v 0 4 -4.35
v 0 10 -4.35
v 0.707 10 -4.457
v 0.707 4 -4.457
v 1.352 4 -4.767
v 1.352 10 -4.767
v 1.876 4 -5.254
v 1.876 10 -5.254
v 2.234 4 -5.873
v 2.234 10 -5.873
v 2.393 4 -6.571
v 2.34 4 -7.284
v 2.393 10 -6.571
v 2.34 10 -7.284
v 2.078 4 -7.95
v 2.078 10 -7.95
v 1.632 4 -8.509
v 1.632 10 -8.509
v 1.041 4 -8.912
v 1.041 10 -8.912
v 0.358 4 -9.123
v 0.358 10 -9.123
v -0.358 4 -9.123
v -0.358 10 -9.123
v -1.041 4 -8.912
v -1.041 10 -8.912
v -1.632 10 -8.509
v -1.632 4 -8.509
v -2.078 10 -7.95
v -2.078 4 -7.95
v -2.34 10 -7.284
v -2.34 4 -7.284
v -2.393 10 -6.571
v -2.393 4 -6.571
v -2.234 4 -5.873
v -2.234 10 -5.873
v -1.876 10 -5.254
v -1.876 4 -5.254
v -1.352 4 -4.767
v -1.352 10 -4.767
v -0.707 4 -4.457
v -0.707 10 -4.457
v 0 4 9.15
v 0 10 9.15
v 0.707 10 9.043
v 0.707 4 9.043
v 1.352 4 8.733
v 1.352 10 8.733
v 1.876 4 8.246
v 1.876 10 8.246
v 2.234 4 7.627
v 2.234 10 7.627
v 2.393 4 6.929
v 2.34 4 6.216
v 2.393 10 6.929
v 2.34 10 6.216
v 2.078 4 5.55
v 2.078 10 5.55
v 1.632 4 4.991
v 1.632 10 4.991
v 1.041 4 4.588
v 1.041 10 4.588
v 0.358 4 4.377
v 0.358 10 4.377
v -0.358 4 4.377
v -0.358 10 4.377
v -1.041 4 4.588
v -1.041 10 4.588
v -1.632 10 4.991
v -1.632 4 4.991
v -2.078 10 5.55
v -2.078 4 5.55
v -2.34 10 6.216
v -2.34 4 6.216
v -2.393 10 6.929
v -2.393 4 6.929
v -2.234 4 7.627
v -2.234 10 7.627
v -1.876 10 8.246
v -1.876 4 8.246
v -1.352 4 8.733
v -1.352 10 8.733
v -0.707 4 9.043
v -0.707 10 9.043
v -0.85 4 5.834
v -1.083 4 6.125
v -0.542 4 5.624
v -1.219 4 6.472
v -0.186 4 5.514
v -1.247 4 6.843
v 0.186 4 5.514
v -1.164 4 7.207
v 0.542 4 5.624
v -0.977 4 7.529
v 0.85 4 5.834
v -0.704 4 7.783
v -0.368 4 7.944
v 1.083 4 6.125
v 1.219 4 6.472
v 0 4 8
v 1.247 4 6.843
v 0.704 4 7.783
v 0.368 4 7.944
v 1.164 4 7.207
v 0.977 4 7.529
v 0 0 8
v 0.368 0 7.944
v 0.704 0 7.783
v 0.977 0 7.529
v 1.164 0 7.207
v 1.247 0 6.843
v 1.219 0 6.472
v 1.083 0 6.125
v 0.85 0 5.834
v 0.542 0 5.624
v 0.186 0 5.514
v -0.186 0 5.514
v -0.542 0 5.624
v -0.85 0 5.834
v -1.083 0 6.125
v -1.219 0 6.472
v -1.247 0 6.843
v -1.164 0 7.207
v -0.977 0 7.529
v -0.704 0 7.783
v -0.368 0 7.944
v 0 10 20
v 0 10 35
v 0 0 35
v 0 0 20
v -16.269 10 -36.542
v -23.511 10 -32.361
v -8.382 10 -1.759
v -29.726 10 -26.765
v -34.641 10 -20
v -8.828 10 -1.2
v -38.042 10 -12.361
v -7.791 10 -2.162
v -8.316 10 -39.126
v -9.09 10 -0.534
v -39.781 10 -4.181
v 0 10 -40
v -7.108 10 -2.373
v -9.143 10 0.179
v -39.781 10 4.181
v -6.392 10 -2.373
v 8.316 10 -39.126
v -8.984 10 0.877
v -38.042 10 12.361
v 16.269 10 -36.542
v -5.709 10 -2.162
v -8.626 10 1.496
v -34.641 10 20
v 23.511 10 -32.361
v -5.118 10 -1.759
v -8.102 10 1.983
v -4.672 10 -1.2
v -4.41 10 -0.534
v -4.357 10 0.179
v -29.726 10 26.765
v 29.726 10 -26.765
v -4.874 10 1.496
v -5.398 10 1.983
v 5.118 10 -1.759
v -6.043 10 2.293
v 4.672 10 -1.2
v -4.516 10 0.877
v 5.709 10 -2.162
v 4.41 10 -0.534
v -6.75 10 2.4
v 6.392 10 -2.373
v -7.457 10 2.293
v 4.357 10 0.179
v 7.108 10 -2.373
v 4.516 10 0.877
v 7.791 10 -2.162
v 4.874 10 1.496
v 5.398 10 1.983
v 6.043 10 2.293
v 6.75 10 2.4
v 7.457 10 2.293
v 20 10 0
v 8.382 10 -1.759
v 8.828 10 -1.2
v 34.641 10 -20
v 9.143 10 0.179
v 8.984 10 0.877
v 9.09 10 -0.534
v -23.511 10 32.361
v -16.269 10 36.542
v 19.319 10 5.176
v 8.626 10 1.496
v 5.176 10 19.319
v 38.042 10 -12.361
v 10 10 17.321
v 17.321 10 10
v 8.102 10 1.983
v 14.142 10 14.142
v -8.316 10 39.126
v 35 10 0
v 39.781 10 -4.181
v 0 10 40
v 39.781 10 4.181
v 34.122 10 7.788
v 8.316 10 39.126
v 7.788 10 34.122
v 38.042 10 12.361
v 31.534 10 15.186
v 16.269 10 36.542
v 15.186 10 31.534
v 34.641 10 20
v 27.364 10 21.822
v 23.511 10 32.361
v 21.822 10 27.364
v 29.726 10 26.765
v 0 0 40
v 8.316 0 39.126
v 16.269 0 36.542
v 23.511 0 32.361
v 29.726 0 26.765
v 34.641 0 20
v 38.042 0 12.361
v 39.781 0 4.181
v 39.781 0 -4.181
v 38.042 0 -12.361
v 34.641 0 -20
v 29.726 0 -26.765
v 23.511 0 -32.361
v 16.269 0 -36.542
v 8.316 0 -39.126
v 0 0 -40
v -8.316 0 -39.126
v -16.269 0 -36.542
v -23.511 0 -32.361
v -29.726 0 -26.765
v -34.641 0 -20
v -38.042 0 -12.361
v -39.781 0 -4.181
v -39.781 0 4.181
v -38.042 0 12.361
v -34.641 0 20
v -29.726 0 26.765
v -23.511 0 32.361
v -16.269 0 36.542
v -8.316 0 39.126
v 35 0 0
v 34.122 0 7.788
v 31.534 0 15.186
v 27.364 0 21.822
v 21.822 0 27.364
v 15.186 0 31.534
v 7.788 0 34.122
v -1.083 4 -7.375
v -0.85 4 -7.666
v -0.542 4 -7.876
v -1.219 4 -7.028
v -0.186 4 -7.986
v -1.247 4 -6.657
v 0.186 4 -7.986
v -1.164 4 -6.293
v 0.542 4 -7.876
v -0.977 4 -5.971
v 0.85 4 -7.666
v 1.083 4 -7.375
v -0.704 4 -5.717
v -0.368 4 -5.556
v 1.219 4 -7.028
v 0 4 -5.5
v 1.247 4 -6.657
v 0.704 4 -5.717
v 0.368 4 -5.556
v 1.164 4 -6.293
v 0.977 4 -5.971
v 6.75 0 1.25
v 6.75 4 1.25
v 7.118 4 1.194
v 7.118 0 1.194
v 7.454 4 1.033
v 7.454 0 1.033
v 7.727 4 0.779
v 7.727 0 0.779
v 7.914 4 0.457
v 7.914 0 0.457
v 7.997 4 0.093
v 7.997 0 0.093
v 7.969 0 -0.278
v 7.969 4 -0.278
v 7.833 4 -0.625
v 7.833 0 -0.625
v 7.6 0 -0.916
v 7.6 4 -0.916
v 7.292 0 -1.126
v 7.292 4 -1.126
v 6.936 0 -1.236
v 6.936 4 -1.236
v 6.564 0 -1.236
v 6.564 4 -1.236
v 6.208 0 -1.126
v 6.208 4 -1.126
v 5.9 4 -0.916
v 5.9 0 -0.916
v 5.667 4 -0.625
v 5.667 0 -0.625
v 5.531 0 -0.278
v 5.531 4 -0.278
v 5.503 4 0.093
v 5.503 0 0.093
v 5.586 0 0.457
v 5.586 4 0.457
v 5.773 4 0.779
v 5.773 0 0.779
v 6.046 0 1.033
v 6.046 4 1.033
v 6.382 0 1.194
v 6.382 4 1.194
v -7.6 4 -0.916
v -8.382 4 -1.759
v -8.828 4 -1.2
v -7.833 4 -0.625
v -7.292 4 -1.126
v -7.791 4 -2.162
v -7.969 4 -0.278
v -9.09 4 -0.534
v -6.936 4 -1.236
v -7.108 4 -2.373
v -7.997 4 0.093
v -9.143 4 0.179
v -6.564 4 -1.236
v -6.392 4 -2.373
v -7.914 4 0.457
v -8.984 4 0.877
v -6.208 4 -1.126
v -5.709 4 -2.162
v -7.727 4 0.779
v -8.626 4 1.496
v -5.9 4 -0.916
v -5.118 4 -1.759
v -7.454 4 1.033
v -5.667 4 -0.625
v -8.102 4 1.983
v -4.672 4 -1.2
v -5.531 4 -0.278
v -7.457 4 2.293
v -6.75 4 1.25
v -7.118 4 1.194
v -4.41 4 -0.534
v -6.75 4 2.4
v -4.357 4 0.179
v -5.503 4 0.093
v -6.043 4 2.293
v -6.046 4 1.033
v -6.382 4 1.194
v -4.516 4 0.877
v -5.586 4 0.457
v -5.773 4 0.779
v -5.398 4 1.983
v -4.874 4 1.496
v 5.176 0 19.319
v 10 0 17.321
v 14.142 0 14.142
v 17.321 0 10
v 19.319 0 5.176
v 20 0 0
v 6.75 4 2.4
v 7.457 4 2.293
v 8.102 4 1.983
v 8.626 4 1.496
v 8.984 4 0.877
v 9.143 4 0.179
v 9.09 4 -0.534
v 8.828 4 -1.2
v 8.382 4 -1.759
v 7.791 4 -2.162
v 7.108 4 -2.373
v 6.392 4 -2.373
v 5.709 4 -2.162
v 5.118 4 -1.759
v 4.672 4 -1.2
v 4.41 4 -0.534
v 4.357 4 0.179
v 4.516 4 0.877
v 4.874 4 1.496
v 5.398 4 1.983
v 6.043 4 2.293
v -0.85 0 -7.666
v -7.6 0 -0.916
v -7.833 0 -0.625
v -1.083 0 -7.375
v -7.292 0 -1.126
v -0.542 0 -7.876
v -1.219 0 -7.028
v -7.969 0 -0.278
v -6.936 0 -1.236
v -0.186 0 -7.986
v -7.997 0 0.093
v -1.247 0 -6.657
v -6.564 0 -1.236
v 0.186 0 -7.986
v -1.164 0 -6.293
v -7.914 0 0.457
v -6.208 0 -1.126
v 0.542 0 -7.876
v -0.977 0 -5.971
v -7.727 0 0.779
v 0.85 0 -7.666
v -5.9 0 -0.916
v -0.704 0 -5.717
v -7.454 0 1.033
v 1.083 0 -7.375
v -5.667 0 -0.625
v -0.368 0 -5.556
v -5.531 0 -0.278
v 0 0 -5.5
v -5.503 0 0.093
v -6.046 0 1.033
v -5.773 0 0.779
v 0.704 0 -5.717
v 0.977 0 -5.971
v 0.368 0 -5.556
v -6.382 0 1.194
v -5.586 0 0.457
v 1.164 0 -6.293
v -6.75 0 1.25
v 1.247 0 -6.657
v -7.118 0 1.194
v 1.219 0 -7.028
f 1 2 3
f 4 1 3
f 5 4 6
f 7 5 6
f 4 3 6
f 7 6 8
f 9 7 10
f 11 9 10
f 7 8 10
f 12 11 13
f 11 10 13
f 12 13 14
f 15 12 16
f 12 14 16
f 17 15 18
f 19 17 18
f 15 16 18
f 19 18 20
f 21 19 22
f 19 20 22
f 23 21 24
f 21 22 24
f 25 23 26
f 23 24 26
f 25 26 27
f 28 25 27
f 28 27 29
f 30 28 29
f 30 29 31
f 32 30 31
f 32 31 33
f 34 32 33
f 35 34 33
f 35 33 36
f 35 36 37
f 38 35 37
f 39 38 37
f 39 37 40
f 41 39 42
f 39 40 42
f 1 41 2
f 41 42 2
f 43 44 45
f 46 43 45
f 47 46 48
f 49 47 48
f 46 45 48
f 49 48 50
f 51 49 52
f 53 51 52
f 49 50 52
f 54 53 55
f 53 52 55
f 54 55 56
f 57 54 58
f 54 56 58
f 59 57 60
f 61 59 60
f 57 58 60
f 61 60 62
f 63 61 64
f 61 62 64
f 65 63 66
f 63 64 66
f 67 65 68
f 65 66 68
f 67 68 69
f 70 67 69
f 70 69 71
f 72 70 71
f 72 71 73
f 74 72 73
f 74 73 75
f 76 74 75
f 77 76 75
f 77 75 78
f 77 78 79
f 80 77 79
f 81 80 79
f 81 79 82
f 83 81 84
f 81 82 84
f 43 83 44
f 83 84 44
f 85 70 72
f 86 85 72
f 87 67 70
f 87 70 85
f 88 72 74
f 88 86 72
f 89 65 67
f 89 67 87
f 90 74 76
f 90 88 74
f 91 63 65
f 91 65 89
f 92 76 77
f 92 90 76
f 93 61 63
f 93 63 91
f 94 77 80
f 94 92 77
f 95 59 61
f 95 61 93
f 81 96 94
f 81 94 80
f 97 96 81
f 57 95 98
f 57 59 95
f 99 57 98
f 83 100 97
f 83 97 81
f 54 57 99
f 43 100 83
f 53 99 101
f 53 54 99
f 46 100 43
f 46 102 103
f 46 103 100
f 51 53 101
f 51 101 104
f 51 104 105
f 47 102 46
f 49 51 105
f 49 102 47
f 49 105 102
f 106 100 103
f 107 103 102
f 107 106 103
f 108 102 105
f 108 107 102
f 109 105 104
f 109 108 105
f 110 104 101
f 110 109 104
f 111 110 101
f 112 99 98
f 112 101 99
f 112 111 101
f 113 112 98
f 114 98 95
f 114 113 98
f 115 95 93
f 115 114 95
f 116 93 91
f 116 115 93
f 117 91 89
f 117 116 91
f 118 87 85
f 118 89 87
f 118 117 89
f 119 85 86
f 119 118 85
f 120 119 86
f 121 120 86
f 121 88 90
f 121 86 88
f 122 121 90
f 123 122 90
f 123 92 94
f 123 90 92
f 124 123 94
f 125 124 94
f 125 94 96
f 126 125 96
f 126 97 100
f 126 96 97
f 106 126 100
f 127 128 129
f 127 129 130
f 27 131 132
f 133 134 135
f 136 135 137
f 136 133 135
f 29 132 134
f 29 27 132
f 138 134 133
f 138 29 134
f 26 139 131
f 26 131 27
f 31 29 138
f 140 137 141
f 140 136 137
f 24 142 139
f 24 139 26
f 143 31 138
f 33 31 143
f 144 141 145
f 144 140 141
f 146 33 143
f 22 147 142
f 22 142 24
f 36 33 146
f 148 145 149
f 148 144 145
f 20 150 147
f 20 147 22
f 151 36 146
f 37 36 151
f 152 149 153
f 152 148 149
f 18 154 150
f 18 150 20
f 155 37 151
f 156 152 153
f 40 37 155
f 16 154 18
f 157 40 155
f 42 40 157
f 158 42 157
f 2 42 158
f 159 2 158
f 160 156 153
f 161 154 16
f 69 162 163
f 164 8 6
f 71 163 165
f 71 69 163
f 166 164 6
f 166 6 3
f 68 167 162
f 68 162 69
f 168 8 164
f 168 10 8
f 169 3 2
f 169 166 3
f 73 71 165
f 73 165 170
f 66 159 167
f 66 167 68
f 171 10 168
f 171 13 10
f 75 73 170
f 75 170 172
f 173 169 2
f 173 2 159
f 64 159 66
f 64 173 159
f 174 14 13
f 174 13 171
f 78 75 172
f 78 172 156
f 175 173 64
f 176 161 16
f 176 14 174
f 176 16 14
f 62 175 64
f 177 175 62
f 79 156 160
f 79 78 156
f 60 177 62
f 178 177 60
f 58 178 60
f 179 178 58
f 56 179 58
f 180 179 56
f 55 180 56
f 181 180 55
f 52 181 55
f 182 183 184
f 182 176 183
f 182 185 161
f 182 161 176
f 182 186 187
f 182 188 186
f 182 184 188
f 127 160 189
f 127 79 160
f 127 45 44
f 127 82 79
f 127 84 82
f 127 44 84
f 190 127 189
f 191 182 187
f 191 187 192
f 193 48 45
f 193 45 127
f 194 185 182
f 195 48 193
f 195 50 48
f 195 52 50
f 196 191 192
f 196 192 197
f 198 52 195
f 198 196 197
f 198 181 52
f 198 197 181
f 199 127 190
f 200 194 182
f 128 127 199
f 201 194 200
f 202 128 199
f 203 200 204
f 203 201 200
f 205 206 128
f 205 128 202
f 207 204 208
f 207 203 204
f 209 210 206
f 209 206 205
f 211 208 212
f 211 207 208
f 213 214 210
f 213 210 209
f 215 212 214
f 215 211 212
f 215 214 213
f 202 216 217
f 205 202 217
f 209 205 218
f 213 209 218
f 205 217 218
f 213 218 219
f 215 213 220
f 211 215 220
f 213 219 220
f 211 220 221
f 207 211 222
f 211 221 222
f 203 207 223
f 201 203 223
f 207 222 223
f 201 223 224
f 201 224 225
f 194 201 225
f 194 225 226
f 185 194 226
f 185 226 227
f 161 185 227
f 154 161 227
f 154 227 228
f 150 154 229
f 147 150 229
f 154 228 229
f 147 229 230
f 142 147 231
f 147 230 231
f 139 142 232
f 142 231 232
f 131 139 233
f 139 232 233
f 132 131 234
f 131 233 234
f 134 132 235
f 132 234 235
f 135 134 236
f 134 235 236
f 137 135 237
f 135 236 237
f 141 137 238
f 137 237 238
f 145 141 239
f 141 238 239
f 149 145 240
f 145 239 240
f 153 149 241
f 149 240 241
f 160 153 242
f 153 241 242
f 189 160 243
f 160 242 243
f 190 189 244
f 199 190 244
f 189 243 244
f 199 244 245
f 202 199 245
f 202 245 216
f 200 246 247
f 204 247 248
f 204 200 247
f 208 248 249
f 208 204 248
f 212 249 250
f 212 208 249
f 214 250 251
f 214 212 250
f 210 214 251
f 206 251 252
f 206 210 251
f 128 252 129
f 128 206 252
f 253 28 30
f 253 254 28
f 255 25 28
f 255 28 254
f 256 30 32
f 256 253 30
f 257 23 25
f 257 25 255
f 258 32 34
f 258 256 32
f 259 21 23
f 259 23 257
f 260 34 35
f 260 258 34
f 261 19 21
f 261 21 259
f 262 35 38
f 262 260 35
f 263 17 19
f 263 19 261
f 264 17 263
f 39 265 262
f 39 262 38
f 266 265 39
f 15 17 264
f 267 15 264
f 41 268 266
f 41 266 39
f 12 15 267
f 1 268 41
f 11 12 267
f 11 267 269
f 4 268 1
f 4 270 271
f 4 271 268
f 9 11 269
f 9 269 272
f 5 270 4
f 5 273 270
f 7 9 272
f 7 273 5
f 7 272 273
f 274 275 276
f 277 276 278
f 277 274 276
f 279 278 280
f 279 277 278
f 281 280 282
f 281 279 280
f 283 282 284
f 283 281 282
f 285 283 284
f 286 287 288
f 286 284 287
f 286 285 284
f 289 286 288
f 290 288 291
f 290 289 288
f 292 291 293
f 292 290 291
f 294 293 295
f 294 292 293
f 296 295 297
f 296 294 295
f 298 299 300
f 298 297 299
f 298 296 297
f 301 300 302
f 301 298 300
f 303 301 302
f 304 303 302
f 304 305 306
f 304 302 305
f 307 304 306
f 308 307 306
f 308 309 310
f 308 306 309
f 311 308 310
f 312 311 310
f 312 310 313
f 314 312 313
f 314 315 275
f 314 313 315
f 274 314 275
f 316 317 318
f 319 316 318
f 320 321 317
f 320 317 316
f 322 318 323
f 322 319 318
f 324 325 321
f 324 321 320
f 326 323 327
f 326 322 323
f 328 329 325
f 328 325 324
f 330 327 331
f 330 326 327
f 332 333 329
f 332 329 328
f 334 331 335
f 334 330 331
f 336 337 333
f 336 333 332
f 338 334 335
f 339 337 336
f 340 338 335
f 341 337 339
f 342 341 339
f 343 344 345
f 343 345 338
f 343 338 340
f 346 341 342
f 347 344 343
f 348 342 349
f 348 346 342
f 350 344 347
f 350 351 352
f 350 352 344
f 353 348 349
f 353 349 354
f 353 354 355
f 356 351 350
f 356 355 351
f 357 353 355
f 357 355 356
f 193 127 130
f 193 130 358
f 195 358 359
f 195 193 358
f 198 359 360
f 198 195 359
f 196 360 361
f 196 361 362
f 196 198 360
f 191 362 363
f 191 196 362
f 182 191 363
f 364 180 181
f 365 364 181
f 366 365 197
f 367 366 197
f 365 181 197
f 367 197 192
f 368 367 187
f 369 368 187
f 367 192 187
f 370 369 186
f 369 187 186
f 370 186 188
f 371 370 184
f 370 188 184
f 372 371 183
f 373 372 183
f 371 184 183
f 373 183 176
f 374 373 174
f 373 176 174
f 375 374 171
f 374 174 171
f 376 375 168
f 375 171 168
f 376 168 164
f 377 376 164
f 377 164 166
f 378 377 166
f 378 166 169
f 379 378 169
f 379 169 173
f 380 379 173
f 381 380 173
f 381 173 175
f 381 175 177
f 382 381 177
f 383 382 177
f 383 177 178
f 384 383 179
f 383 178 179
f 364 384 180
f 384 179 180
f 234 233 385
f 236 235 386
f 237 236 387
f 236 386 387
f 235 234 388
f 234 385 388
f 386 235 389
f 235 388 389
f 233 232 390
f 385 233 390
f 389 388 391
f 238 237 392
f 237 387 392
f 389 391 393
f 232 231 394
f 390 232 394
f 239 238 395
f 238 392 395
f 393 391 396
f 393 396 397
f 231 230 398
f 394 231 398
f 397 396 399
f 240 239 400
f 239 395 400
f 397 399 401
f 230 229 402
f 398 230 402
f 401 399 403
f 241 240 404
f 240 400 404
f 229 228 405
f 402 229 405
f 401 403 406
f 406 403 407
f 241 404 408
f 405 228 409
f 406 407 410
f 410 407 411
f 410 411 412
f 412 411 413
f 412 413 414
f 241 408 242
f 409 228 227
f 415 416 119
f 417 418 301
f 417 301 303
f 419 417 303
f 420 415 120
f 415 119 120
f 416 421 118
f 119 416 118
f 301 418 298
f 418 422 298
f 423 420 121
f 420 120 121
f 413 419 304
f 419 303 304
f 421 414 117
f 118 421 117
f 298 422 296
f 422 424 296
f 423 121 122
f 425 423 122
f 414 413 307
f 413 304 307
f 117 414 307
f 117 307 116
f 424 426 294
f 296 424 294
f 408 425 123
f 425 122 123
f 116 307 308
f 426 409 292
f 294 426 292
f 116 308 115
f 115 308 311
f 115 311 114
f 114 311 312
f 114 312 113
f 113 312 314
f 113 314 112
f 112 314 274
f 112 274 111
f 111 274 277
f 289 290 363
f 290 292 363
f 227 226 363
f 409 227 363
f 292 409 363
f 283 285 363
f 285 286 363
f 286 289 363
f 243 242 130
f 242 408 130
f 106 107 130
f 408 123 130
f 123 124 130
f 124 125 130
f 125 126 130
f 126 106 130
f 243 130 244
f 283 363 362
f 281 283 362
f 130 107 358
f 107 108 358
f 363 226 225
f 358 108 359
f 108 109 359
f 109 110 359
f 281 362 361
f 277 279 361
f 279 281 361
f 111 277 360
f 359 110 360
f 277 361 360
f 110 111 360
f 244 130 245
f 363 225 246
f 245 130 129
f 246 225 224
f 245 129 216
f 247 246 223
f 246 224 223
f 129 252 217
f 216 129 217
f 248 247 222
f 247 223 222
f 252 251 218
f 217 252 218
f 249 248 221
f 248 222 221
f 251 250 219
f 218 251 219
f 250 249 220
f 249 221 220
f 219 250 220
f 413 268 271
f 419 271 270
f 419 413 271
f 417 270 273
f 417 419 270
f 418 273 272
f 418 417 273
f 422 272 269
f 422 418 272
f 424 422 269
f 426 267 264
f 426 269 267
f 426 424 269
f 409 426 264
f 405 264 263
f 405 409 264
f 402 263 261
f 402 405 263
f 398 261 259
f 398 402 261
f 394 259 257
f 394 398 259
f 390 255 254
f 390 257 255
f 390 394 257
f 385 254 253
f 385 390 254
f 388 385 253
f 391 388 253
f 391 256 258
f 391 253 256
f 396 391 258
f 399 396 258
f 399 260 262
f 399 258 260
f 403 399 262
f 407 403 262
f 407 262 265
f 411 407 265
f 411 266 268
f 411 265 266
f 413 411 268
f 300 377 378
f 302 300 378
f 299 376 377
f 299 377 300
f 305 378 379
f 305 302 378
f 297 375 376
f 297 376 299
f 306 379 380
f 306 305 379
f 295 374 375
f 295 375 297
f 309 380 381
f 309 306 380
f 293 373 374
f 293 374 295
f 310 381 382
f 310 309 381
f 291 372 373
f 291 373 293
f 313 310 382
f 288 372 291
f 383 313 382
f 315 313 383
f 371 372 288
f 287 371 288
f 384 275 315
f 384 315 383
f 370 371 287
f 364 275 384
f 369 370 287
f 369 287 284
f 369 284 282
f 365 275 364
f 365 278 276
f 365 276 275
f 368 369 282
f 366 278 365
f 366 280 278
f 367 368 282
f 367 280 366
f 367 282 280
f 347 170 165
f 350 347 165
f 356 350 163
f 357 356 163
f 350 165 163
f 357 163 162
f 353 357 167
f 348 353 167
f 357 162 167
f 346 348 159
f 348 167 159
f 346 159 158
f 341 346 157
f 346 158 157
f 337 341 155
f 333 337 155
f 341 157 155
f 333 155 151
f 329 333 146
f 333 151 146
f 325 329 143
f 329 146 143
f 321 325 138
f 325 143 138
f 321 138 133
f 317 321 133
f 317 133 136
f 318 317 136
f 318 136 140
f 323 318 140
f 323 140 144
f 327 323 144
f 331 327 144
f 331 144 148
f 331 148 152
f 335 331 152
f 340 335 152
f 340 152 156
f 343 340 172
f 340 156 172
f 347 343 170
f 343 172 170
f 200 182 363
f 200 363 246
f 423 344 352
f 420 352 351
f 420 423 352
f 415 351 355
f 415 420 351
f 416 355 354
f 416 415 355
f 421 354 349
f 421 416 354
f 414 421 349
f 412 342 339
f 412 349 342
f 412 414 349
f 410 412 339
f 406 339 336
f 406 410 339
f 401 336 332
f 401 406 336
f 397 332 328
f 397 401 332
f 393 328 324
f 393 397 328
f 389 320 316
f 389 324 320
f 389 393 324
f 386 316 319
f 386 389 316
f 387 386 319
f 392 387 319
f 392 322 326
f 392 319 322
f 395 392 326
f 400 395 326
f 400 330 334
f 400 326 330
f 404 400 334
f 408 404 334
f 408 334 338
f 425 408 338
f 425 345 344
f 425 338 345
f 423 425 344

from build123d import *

# Parameters (mm, degrees)
SKETCH_1_R          = 40
SKETCH_1_R_2        = 1.25
EXTRUDE_1_DEPTH     = 10
SKETCH_2_R          = 2.4
CUT_EXTRUDE_1_DEPTH = 6
CUT_EXTRUDE_2_DEPTH = 58.445626465


with BuildPart() as part:
    # 草图1 → 凸台-拉伸1 (new body)
    with BuildSketch(Plane(origin=(0, 0, 0), x_dir=(1, 0, 0), z_dir=(0, 1, 0))):
        with Locations(Location((0, 0, 0), (0, 0, 270))):
            Circle(SKETCH_1_R)
        with Locations(Location((6.75, 0, 0), (0, 0, 270))):
            Circle(SKETCH_1_R_2, mode=Mode.SUBTRACT)
        with Locations(Location((0, -6.75, 0), (0, 0, 270))):
            Circle(SKETCH_1_R_2, mode=Mode.SUBTRACT)
        with Locations(Location((-6.75, 0, 0), (0, 0, 270))):
            Circle(SKETCH_1_R_2, mode=Mode.SUBTRACT)
        with Locations(Location((0, 6.75, 0), (0, 0, 270))):
            Circle(SKETCH_1_R_2, mode=Mode.SUBTRACT)
    extrude(amount=EXTRUDE_1_DEPTH)

    # 草图2 → 切除-拉伸1 (cut)
    with BuildSketch(Plane(origin=(0, 10, 0), x_dir=(1, 0, 0), z_dir=(0, 1, 0))):
        with Locations(Location((0, 6.75, 0), (0, 0, 270))):
            Circle(SKETCH_2_R)
        with Locations(Location((6.75, 0, 0), (0, 0, 270))):
            Circle(SKETCH_2_R)
        with Locations(Location((0, -6.75, 0), (0, 0, 270))):
            Circle(SKETCH_2_R)
        with Locations(Location((-6.75, 0, 0), (0, 0, 270))):
            Circle(SKETCH_2_R)
    extrude(amount=-CUT_EXTRUDE_1_DEPTH, mode=Mode.SUBTRACT)

    # 草图3 → 切除-拉伸2 (cut, through all)
    with BuildSketch(Plane(origin=(0, 10, 0), x_dir=(1, 0, 0), z_dir=(0, 1, 0))):
        with BuildLine():
            Line((20, 0), (35, 0))
            ThreePointArc((35, 0), (24.748737342, -24.748737342), (0, -35))
            Line((0, -35), (0, -20))
            ThreePointArc((0, -20), (14.142135624, -14.142135624), (20, 0))
        make_face()
    extrude(amount=-CUT_EXTRUDE_2_DEPTH, mode=Mode.SUBTRACT)


solid = part.part
